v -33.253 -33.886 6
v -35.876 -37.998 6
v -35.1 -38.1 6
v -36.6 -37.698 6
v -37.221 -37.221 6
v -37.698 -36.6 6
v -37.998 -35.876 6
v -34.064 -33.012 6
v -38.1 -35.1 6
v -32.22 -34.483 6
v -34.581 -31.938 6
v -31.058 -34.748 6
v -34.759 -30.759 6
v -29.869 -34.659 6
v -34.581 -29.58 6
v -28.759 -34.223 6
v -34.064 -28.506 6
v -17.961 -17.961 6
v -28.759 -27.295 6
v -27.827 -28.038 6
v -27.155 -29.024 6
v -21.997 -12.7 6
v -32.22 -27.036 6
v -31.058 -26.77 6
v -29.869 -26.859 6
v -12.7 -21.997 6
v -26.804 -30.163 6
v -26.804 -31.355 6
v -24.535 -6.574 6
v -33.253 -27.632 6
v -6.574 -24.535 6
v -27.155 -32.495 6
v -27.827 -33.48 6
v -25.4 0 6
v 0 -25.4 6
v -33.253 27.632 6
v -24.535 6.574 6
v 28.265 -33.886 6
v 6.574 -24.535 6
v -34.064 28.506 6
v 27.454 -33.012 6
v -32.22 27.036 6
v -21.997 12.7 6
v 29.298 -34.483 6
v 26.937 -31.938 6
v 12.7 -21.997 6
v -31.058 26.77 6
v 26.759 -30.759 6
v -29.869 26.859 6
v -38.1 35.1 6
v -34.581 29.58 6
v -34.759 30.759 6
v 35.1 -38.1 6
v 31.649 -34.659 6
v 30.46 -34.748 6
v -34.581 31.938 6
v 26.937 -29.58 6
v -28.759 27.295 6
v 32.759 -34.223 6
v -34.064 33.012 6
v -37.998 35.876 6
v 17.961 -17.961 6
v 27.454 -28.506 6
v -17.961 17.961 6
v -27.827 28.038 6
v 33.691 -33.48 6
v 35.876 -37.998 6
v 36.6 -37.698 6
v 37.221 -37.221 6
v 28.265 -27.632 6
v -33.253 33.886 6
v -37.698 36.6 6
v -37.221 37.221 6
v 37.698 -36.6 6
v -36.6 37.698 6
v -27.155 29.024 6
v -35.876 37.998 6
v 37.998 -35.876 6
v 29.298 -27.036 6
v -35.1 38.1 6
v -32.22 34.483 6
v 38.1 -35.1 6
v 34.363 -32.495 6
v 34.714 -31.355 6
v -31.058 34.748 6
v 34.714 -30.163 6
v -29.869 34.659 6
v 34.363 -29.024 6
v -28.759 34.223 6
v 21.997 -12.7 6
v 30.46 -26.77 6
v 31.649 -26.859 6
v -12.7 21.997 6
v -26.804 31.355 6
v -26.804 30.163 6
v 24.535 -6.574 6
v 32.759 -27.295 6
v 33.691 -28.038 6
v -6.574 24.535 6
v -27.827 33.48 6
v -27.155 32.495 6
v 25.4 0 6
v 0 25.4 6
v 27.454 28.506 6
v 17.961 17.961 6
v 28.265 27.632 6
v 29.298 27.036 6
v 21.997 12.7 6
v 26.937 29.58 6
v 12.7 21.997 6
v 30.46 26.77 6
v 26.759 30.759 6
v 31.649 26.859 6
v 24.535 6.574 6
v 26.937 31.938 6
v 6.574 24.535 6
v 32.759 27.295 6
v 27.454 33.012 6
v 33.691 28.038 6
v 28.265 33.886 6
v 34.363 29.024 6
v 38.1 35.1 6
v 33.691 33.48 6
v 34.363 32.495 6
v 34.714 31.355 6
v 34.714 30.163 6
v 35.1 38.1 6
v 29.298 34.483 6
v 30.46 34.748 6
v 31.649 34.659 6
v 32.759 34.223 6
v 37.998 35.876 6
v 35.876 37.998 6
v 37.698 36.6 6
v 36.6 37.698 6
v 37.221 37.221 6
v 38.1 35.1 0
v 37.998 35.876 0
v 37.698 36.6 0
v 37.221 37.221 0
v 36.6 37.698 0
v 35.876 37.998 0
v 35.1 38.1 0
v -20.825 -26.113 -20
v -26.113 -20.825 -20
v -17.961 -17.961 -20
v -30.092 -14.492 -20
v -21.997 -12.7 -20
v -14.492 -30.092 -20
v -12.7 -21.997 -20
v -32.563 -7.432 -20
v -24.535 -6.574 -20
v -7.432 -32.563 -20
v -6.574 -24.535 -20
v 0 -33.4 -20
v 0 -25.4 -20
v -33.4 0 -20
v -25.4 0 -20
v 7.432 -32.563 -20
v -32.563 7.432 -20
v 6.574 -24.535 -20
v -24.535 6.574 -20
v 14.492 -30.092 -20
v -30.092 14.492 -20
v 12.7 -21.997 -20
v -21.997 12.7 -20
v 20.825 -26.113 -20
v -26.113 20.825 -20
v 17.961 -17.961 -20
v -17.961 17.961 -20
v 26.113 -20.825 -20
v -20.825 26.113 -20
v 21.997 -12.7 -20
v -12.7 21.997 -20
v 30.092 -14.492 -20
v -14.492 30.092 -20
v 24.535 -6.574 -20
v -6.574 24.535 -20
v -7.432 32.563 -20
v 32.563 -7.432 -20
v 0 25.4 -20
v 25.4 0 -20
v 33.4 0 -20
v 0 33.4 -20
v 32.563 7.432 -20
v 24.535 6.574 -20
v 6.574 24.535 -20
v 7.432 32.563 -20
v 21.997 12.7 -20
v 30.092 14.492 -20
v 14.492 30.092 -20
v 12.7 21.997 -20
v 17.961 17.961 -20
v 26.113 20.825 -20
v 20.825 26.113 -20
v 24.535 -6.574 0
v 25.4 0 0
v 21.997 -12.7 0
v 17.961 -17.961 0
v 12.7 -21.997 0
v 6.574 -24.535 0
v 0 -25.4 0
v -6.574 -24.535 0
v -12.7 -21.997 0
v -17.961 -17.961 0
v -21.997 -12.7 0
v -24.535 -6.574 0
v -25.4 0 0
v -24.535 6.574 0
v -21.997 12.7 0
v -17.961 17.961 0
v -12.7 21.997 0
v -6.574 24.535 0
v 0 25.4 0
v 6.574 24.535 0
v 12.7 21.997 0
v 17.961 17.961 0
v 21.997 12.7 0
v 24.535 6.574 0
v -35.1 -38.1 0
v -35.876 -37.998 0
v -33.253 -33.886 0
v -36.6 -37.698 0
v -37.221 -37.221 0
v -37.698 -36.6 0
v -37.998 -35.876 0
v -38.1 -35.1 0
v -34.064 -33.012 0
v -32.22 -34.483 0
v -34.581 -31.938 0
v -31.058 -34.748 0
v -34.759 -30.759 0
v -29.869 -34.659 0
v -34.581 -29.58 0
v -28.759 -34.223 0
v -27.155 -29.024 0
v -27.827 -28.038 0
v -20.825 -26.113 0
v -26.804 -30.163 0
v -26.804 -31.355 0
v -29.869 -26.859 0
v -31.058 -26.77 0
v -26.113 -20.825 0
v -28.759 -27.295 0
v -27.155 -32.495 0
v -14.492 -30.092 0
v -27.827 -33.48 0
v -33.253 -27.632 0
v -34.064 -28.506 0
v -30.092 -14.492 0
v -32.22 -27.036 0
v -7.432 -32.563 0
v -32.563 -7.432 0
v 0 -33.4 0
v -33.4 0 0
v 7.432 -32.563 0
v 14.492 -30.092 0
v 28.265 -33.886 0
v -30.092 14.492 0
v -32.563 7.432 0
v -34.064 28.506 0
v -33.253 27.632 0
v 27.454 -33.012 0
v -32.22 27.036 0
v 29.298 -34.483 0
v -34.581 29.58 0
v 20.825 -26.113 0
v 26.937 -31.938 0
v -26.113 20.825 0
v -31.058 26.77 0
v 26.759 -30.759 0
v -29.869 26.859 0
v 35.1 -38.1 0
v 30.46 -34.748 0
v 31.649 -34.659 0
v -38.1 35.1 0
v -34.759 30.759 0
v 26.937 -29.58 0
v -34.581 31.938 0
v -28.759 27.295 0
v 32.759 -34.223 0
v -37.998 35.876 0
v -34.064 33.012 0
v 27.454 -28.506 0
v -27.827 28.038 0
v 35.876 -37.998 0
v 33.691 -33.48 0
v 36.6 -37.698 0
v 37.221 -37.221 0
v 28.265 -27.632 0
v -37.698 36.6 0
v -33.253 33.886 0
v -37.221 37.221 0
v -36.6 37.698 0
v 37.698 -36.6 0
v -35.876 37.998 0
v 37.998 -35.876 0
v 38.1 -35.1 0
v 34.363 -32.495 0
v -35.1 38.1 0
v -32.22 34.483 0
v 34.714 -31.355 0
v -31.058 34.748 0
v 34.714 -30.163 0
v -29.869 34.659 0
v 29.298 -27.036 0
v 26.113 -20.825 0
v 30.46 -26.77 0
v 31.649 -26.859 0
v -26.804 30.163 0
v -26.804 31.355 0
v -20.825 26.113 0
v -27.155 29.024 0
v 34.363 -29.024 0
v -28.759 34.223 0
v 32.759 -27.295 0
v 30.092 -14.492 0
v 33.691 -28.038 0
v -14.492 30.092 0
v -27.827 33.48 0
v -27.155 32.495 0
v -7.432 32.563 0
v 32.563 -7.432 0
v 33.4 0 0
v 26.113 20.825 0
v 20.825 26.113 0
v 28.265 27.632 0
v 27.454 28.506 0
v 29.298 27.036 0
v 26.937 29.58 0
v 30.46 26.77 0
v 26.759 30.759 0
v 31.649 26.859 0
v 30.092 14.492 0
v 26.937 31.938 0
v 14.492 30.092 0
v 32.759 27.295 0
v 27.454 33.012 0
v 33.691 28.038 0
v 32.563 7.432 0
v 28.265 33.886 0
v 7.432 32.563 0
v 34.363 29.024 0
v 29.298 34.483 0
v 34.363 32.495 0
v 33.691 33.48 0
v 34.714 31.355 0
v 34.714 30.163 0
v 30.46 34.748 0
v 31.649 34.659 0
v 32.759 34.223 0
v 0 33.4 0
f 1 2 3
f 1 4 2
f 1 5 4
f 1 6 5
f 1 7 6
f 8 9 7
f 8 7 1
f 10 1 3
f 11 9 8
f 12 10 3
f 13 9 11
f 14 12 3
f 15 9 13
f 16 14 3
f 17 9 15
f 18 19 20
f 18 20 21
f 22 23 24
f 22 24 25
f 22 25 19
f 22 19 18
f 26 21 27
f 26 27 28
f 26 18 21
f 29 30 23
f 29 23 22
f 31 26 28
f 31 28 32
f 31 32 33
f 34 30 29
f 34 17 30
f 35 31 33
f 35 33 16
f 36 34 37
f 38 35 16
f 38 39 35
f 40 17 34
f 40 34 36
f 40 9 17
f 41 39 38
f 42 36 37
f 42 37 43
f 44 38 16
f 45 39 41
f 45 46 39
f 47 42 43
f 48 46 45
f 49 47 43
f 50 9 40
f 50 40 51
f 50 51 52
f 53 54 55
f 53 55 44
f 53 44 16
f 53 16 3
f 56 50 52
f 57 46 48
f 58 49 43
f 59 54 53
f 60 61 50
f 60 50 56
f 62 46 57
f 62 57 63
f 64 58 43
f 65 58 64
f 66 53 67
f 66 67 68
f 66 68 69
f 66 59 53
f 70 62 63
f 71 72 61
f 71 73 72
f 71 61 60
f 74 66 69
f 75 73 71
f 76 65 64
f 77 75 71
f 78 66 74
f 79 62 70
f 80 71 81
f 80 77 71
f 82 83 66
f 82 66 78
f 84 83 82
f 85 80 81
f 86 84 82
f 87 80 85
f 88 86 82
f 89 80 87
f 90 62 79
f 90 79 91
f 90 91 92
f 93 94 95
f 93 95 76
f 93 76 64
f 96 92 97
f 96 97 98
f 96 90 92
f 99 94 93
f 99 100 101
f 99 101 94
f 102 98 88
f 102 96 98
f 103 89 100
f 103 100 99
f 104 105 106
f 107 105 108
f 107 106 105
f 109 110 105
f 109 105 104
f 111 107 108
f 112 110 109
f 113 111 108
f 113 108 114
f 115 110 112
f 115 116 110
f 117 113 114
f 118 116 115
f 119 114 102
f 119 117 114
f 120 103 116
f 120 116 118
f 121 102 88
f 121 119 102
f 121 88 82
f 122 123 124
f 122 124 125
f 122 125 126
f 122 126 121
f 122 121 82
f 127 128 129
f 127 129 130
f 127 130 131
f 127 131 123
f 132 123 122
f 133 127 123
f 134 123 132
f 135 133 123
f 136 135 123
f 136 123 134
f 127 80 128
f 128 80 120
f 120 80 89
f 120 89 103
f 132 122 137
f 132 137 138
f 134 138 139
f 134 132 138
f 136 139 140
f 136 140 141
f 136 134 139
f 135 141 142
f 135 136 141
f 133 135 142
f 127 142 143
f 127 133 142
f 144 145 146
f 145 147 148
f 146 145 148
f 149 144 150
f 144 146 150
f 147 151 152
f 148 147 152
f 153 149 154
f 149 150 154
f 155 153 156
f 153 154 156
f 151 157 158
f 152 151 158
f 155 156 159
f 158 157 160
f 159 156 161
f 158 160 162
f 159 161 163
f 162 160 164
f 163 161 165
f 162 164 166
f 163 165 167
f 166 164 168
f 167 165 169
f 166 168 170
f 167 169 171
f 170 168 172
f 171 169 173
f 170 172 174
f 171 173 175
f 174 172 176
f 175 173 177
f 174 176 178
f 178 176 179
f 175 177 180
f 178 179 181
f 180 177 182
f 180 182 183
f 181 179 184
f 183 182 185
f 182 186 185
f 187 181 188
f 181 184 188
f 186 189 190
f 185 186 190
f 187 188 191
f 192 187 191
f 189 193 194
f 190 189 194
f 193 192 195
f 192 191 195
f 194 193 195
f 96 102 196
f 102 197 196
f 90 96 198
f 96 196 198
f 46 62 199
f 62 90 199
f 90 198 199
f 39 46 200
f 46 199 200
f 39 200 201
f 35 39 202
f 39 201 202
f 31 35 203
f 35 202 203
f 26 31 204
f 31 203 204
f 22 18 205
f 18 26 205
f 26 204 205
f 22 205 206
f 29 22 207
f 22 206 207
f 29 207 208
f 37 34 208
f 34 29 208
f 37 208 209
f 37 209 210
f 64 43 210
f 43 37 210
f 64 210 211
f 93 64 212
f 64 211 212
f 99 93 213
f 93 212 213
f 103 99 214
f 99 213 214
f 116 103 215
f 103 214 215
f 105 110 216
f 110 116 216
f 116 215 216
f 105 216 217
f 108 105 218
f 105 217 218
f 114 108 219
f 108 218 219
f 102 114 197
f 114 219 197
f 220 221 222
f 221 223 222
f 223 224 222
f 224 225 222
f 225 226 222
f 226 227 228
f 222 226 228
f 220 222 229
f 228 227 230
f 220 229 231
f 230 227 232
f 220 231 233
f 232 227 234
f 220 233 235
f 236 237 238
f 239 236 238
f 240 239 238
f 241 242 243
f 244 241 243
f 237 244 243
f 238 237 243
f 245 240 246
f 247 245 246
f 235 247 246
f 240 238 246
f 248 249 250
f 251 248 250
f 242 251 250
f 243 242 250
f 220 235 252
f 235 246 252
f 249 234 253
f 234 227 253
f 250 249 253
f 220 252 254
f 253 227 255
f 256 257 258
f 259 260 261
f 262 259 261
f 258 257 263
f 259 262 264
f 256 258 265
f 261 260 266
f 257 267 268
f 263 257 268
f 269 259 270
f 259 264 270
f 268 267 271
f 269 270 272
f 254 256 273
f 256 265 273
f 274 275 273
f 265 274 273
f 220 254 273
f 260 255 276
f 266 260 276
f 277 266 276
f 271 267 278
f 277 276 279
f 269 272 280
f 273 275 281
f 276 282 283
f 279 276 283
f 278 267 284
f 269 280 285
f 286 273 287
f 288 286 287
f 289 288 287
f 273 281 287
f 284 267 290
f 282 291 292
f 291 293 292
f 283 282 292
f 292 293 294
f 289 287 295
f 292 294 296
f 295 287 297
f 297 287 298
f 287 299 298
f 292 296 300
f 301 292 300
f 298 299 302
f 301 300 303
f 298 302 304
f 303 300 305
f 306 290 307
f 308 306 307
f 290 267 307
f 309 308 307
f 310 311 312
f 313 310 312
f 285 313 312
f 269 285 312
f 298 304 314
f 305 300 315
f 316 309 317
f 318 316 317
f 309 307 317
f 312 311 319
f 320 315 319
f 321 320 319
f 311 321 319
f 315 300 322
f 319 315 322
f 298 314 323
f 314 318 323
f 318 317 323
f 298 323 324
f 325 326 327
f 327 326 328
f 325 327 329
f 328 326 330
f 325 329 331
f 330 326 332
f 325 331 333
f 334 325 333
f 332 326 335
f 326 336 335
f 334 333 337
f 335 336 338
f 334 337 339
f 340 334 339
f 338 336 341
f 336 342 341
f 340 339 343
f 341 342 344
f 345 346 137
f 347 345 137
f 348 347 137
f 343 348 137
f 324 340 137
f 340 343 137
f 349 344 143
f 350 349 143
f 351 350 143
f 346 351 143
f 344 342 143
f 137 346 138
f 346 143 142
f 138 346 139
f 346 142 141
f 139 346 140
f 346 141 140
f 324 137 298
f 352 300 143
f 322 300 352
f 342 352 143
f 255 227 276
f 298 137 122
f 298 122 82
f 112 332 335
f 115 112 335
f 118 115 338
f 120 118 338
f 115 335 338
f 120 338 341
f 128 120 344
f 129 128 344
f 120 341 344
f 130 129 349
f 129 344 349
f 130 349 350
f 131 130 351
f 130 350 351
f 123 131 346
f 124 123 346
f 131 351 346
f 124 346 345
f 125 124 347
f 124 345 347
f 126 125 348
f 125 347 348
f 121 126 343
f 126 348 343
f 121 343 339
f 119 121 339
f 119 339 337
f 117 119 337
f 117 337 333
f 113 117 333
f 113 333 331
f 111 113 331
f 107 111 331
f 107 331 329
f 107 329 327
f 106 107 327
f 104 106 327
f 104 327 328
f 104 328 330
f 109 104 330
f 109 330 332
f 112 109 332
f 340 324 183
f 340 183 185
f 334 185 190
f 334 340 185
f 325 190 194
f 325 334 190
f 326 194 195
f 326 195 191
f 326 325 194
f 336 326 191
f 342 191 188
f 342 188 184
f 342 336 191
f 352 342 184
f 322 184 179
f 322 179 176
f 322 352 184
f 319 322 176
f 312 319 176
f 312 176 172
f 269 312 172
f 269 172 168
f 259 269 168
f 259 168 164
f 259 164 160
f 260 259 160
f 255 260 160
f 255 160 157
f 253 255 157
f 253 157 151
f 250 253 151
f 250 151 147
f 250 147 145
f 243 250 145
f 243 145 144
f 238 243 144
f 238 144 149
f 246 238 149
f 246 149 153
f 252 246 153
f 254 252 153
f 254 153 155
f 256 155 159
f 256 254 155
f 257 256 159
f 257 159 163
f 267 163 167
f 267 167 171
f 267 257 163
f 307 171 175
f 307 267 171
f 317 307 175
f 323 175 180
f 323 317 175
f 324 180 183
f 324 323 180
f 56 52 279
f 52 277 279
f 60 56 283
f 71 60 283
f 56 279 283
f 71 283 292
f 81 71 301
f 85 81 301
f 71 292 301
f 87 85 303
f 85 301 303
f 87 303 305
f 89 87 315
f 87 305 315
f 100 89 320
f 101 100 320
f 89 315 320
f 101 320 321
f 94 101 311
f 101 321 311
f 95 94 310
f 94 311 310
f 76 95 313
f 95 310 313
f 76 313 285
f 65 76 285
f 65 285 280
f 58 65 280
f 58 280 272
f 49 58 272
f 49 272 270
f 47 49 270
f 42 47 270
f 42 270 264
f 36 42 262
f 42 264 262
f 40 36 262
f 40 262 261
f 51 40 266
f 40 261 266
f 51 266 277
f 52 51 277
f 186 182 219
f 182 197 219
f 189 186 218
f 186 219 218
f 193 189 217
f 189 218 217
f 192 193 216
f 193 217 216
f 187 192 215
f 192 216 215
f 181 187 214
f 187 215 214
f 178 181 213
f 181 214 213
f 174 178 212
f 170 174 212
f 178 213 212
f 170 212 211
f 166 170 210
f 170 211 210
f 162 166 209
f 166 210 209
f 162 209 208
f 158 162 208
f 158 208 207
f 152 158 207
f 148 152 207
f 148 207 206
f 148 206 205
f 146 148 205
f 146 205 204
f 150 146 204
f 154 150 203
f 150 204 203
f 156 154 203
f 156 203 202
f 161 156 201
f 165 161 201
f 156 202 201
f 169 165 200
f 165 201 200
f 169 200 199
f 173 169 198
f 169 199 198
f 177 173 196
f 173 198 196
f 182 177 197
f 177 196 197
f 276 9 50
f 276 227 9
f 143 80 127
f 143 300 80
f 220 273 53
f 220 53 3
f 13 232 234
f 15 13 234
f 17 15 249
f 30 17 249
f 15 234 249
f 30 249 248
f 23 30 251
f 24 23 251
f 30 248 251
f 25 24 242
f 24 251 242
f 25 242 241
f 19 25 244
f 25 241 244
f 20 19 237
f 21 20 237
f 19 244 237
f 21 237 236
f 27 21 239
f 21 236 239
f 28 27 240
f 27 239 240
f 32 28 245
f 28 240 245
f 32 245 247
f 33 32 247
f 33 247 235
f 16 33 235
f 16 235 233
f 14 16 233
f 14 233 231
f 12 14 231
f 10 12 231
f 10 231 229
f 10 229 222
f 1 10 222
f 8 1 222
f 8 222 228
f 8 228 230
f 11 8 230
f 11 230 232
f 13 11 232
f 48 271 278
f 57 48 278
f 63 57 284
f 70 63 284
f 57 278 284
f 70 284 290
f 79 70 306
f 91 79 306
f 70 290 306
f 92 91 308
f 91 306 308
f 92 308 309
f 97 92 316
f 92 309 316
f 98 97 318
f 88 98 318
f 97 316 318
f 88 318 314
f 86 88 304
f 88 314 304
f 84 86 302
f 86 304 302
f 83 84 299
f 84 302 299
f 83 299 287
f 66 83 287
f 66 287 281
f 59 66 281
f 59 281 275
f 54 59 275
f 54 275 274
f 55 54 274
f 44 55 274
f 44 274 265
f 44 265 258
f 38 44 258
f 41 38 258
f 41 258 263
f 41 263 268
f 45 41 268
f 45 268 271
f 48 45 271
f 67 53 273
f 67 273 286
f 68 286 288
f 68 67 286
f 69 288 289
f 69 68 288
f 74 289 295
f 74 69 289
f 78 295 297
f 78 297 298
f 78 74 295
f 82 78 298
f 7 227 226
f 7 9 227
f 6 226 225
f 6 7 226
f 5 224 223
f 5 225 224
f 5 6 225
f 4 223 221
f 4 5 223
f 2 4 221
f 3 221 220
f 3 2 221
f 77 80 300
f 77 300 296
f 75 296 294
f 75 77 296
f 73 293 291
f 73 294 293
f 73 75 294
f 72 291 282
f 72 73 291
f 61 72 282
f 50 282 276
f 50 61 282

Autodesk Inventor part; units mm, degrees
ref_plane "YZ Plane" through (0, 0, 0) normal (1, 0, 0) x (0, 1, 0)
ref_plane "XZ Plane" through (0, 0, 0) normal (0, 1, 0) x (-1, 0, 0)
ref_plane "XY Plane" through (0, 0, 0) normal (0, 0, 1) x (1, 0, 0)
sketch "Boceto1" plane through (0, 0, 0) normal (0, 0, 1) x (1, 0, 0)
  line L0 (38.1, -38.1) -> (-38.1, -38.1)
  line L1 (-38.1, -38.1) -> (-38.1, 38.1)
  line L2 (-38.1, 38.1) -> (38.1, 38.1)
  line L3 (38.1, 38.1) -> (38.1, -38.1)
  line L4 (38.1, -38.1) -> (-38.1, 38.1) construction
  line L5 (-38.1, -38.1) -> (38.1, 38.1) construction
  circle A0 centre (0, 0) radius 25.4
  circle A1 centre (0, 0) radius 33.4
  dimension "d0" = 76.2
  dimension "d1" = 76.2
  dimension "d2" = 50.8
  dimension "d3" = 8
extrude "Extrusión1" add sketch "Boceto1" along normal blind 6 contours L0 L1 L2 L3 | A1
extrude "Extrusión2" add sketch "Boceto1" against normal blind 20 contours A1
sketch "Boceto2" plane through (0, 0, 0) normal (0, 0, -1) x (-1, 0, 0)
  line L0 (-38.1, 38.1) -> (38.1, 38.1) projected
  circle A0 centre (0, 0) radius 25.4 projected
  line L1 (38.1, 38.1) -> (38.1, -38.1) projected
  line L2 (38.1, -38.1) -> (-38.1, -38.1) projected
  line L3 (-38.1, -38.1) -> (-38.1, 38.1) projected
  circle A1 centre (30.7591, 30.7591) radius 4
  circle A2 centre (-30.7591, 30.7591) radius 4
  circle A3 centre (-30.7591, -30.7591) radius 4
  circle A4 centre (30.7591, -30.7591) radius 4
  dimension "d10" = 8
  dimension "d11" = 8
  dimension "d12" = 8
  dimension "d13" = 8
extrude "Extrusión3" cut sketch "Boceto2" against normal blind 20 contours A1 | A2 | A3 | A4
fillet "Empalme1" radius 3 4 edges at (-38.1, 38.1, 3) (38.1, 38.1, 3) (38.1, -38.1, 3) (-38.1, -38.1, 3)
properties part number "chumacera"
